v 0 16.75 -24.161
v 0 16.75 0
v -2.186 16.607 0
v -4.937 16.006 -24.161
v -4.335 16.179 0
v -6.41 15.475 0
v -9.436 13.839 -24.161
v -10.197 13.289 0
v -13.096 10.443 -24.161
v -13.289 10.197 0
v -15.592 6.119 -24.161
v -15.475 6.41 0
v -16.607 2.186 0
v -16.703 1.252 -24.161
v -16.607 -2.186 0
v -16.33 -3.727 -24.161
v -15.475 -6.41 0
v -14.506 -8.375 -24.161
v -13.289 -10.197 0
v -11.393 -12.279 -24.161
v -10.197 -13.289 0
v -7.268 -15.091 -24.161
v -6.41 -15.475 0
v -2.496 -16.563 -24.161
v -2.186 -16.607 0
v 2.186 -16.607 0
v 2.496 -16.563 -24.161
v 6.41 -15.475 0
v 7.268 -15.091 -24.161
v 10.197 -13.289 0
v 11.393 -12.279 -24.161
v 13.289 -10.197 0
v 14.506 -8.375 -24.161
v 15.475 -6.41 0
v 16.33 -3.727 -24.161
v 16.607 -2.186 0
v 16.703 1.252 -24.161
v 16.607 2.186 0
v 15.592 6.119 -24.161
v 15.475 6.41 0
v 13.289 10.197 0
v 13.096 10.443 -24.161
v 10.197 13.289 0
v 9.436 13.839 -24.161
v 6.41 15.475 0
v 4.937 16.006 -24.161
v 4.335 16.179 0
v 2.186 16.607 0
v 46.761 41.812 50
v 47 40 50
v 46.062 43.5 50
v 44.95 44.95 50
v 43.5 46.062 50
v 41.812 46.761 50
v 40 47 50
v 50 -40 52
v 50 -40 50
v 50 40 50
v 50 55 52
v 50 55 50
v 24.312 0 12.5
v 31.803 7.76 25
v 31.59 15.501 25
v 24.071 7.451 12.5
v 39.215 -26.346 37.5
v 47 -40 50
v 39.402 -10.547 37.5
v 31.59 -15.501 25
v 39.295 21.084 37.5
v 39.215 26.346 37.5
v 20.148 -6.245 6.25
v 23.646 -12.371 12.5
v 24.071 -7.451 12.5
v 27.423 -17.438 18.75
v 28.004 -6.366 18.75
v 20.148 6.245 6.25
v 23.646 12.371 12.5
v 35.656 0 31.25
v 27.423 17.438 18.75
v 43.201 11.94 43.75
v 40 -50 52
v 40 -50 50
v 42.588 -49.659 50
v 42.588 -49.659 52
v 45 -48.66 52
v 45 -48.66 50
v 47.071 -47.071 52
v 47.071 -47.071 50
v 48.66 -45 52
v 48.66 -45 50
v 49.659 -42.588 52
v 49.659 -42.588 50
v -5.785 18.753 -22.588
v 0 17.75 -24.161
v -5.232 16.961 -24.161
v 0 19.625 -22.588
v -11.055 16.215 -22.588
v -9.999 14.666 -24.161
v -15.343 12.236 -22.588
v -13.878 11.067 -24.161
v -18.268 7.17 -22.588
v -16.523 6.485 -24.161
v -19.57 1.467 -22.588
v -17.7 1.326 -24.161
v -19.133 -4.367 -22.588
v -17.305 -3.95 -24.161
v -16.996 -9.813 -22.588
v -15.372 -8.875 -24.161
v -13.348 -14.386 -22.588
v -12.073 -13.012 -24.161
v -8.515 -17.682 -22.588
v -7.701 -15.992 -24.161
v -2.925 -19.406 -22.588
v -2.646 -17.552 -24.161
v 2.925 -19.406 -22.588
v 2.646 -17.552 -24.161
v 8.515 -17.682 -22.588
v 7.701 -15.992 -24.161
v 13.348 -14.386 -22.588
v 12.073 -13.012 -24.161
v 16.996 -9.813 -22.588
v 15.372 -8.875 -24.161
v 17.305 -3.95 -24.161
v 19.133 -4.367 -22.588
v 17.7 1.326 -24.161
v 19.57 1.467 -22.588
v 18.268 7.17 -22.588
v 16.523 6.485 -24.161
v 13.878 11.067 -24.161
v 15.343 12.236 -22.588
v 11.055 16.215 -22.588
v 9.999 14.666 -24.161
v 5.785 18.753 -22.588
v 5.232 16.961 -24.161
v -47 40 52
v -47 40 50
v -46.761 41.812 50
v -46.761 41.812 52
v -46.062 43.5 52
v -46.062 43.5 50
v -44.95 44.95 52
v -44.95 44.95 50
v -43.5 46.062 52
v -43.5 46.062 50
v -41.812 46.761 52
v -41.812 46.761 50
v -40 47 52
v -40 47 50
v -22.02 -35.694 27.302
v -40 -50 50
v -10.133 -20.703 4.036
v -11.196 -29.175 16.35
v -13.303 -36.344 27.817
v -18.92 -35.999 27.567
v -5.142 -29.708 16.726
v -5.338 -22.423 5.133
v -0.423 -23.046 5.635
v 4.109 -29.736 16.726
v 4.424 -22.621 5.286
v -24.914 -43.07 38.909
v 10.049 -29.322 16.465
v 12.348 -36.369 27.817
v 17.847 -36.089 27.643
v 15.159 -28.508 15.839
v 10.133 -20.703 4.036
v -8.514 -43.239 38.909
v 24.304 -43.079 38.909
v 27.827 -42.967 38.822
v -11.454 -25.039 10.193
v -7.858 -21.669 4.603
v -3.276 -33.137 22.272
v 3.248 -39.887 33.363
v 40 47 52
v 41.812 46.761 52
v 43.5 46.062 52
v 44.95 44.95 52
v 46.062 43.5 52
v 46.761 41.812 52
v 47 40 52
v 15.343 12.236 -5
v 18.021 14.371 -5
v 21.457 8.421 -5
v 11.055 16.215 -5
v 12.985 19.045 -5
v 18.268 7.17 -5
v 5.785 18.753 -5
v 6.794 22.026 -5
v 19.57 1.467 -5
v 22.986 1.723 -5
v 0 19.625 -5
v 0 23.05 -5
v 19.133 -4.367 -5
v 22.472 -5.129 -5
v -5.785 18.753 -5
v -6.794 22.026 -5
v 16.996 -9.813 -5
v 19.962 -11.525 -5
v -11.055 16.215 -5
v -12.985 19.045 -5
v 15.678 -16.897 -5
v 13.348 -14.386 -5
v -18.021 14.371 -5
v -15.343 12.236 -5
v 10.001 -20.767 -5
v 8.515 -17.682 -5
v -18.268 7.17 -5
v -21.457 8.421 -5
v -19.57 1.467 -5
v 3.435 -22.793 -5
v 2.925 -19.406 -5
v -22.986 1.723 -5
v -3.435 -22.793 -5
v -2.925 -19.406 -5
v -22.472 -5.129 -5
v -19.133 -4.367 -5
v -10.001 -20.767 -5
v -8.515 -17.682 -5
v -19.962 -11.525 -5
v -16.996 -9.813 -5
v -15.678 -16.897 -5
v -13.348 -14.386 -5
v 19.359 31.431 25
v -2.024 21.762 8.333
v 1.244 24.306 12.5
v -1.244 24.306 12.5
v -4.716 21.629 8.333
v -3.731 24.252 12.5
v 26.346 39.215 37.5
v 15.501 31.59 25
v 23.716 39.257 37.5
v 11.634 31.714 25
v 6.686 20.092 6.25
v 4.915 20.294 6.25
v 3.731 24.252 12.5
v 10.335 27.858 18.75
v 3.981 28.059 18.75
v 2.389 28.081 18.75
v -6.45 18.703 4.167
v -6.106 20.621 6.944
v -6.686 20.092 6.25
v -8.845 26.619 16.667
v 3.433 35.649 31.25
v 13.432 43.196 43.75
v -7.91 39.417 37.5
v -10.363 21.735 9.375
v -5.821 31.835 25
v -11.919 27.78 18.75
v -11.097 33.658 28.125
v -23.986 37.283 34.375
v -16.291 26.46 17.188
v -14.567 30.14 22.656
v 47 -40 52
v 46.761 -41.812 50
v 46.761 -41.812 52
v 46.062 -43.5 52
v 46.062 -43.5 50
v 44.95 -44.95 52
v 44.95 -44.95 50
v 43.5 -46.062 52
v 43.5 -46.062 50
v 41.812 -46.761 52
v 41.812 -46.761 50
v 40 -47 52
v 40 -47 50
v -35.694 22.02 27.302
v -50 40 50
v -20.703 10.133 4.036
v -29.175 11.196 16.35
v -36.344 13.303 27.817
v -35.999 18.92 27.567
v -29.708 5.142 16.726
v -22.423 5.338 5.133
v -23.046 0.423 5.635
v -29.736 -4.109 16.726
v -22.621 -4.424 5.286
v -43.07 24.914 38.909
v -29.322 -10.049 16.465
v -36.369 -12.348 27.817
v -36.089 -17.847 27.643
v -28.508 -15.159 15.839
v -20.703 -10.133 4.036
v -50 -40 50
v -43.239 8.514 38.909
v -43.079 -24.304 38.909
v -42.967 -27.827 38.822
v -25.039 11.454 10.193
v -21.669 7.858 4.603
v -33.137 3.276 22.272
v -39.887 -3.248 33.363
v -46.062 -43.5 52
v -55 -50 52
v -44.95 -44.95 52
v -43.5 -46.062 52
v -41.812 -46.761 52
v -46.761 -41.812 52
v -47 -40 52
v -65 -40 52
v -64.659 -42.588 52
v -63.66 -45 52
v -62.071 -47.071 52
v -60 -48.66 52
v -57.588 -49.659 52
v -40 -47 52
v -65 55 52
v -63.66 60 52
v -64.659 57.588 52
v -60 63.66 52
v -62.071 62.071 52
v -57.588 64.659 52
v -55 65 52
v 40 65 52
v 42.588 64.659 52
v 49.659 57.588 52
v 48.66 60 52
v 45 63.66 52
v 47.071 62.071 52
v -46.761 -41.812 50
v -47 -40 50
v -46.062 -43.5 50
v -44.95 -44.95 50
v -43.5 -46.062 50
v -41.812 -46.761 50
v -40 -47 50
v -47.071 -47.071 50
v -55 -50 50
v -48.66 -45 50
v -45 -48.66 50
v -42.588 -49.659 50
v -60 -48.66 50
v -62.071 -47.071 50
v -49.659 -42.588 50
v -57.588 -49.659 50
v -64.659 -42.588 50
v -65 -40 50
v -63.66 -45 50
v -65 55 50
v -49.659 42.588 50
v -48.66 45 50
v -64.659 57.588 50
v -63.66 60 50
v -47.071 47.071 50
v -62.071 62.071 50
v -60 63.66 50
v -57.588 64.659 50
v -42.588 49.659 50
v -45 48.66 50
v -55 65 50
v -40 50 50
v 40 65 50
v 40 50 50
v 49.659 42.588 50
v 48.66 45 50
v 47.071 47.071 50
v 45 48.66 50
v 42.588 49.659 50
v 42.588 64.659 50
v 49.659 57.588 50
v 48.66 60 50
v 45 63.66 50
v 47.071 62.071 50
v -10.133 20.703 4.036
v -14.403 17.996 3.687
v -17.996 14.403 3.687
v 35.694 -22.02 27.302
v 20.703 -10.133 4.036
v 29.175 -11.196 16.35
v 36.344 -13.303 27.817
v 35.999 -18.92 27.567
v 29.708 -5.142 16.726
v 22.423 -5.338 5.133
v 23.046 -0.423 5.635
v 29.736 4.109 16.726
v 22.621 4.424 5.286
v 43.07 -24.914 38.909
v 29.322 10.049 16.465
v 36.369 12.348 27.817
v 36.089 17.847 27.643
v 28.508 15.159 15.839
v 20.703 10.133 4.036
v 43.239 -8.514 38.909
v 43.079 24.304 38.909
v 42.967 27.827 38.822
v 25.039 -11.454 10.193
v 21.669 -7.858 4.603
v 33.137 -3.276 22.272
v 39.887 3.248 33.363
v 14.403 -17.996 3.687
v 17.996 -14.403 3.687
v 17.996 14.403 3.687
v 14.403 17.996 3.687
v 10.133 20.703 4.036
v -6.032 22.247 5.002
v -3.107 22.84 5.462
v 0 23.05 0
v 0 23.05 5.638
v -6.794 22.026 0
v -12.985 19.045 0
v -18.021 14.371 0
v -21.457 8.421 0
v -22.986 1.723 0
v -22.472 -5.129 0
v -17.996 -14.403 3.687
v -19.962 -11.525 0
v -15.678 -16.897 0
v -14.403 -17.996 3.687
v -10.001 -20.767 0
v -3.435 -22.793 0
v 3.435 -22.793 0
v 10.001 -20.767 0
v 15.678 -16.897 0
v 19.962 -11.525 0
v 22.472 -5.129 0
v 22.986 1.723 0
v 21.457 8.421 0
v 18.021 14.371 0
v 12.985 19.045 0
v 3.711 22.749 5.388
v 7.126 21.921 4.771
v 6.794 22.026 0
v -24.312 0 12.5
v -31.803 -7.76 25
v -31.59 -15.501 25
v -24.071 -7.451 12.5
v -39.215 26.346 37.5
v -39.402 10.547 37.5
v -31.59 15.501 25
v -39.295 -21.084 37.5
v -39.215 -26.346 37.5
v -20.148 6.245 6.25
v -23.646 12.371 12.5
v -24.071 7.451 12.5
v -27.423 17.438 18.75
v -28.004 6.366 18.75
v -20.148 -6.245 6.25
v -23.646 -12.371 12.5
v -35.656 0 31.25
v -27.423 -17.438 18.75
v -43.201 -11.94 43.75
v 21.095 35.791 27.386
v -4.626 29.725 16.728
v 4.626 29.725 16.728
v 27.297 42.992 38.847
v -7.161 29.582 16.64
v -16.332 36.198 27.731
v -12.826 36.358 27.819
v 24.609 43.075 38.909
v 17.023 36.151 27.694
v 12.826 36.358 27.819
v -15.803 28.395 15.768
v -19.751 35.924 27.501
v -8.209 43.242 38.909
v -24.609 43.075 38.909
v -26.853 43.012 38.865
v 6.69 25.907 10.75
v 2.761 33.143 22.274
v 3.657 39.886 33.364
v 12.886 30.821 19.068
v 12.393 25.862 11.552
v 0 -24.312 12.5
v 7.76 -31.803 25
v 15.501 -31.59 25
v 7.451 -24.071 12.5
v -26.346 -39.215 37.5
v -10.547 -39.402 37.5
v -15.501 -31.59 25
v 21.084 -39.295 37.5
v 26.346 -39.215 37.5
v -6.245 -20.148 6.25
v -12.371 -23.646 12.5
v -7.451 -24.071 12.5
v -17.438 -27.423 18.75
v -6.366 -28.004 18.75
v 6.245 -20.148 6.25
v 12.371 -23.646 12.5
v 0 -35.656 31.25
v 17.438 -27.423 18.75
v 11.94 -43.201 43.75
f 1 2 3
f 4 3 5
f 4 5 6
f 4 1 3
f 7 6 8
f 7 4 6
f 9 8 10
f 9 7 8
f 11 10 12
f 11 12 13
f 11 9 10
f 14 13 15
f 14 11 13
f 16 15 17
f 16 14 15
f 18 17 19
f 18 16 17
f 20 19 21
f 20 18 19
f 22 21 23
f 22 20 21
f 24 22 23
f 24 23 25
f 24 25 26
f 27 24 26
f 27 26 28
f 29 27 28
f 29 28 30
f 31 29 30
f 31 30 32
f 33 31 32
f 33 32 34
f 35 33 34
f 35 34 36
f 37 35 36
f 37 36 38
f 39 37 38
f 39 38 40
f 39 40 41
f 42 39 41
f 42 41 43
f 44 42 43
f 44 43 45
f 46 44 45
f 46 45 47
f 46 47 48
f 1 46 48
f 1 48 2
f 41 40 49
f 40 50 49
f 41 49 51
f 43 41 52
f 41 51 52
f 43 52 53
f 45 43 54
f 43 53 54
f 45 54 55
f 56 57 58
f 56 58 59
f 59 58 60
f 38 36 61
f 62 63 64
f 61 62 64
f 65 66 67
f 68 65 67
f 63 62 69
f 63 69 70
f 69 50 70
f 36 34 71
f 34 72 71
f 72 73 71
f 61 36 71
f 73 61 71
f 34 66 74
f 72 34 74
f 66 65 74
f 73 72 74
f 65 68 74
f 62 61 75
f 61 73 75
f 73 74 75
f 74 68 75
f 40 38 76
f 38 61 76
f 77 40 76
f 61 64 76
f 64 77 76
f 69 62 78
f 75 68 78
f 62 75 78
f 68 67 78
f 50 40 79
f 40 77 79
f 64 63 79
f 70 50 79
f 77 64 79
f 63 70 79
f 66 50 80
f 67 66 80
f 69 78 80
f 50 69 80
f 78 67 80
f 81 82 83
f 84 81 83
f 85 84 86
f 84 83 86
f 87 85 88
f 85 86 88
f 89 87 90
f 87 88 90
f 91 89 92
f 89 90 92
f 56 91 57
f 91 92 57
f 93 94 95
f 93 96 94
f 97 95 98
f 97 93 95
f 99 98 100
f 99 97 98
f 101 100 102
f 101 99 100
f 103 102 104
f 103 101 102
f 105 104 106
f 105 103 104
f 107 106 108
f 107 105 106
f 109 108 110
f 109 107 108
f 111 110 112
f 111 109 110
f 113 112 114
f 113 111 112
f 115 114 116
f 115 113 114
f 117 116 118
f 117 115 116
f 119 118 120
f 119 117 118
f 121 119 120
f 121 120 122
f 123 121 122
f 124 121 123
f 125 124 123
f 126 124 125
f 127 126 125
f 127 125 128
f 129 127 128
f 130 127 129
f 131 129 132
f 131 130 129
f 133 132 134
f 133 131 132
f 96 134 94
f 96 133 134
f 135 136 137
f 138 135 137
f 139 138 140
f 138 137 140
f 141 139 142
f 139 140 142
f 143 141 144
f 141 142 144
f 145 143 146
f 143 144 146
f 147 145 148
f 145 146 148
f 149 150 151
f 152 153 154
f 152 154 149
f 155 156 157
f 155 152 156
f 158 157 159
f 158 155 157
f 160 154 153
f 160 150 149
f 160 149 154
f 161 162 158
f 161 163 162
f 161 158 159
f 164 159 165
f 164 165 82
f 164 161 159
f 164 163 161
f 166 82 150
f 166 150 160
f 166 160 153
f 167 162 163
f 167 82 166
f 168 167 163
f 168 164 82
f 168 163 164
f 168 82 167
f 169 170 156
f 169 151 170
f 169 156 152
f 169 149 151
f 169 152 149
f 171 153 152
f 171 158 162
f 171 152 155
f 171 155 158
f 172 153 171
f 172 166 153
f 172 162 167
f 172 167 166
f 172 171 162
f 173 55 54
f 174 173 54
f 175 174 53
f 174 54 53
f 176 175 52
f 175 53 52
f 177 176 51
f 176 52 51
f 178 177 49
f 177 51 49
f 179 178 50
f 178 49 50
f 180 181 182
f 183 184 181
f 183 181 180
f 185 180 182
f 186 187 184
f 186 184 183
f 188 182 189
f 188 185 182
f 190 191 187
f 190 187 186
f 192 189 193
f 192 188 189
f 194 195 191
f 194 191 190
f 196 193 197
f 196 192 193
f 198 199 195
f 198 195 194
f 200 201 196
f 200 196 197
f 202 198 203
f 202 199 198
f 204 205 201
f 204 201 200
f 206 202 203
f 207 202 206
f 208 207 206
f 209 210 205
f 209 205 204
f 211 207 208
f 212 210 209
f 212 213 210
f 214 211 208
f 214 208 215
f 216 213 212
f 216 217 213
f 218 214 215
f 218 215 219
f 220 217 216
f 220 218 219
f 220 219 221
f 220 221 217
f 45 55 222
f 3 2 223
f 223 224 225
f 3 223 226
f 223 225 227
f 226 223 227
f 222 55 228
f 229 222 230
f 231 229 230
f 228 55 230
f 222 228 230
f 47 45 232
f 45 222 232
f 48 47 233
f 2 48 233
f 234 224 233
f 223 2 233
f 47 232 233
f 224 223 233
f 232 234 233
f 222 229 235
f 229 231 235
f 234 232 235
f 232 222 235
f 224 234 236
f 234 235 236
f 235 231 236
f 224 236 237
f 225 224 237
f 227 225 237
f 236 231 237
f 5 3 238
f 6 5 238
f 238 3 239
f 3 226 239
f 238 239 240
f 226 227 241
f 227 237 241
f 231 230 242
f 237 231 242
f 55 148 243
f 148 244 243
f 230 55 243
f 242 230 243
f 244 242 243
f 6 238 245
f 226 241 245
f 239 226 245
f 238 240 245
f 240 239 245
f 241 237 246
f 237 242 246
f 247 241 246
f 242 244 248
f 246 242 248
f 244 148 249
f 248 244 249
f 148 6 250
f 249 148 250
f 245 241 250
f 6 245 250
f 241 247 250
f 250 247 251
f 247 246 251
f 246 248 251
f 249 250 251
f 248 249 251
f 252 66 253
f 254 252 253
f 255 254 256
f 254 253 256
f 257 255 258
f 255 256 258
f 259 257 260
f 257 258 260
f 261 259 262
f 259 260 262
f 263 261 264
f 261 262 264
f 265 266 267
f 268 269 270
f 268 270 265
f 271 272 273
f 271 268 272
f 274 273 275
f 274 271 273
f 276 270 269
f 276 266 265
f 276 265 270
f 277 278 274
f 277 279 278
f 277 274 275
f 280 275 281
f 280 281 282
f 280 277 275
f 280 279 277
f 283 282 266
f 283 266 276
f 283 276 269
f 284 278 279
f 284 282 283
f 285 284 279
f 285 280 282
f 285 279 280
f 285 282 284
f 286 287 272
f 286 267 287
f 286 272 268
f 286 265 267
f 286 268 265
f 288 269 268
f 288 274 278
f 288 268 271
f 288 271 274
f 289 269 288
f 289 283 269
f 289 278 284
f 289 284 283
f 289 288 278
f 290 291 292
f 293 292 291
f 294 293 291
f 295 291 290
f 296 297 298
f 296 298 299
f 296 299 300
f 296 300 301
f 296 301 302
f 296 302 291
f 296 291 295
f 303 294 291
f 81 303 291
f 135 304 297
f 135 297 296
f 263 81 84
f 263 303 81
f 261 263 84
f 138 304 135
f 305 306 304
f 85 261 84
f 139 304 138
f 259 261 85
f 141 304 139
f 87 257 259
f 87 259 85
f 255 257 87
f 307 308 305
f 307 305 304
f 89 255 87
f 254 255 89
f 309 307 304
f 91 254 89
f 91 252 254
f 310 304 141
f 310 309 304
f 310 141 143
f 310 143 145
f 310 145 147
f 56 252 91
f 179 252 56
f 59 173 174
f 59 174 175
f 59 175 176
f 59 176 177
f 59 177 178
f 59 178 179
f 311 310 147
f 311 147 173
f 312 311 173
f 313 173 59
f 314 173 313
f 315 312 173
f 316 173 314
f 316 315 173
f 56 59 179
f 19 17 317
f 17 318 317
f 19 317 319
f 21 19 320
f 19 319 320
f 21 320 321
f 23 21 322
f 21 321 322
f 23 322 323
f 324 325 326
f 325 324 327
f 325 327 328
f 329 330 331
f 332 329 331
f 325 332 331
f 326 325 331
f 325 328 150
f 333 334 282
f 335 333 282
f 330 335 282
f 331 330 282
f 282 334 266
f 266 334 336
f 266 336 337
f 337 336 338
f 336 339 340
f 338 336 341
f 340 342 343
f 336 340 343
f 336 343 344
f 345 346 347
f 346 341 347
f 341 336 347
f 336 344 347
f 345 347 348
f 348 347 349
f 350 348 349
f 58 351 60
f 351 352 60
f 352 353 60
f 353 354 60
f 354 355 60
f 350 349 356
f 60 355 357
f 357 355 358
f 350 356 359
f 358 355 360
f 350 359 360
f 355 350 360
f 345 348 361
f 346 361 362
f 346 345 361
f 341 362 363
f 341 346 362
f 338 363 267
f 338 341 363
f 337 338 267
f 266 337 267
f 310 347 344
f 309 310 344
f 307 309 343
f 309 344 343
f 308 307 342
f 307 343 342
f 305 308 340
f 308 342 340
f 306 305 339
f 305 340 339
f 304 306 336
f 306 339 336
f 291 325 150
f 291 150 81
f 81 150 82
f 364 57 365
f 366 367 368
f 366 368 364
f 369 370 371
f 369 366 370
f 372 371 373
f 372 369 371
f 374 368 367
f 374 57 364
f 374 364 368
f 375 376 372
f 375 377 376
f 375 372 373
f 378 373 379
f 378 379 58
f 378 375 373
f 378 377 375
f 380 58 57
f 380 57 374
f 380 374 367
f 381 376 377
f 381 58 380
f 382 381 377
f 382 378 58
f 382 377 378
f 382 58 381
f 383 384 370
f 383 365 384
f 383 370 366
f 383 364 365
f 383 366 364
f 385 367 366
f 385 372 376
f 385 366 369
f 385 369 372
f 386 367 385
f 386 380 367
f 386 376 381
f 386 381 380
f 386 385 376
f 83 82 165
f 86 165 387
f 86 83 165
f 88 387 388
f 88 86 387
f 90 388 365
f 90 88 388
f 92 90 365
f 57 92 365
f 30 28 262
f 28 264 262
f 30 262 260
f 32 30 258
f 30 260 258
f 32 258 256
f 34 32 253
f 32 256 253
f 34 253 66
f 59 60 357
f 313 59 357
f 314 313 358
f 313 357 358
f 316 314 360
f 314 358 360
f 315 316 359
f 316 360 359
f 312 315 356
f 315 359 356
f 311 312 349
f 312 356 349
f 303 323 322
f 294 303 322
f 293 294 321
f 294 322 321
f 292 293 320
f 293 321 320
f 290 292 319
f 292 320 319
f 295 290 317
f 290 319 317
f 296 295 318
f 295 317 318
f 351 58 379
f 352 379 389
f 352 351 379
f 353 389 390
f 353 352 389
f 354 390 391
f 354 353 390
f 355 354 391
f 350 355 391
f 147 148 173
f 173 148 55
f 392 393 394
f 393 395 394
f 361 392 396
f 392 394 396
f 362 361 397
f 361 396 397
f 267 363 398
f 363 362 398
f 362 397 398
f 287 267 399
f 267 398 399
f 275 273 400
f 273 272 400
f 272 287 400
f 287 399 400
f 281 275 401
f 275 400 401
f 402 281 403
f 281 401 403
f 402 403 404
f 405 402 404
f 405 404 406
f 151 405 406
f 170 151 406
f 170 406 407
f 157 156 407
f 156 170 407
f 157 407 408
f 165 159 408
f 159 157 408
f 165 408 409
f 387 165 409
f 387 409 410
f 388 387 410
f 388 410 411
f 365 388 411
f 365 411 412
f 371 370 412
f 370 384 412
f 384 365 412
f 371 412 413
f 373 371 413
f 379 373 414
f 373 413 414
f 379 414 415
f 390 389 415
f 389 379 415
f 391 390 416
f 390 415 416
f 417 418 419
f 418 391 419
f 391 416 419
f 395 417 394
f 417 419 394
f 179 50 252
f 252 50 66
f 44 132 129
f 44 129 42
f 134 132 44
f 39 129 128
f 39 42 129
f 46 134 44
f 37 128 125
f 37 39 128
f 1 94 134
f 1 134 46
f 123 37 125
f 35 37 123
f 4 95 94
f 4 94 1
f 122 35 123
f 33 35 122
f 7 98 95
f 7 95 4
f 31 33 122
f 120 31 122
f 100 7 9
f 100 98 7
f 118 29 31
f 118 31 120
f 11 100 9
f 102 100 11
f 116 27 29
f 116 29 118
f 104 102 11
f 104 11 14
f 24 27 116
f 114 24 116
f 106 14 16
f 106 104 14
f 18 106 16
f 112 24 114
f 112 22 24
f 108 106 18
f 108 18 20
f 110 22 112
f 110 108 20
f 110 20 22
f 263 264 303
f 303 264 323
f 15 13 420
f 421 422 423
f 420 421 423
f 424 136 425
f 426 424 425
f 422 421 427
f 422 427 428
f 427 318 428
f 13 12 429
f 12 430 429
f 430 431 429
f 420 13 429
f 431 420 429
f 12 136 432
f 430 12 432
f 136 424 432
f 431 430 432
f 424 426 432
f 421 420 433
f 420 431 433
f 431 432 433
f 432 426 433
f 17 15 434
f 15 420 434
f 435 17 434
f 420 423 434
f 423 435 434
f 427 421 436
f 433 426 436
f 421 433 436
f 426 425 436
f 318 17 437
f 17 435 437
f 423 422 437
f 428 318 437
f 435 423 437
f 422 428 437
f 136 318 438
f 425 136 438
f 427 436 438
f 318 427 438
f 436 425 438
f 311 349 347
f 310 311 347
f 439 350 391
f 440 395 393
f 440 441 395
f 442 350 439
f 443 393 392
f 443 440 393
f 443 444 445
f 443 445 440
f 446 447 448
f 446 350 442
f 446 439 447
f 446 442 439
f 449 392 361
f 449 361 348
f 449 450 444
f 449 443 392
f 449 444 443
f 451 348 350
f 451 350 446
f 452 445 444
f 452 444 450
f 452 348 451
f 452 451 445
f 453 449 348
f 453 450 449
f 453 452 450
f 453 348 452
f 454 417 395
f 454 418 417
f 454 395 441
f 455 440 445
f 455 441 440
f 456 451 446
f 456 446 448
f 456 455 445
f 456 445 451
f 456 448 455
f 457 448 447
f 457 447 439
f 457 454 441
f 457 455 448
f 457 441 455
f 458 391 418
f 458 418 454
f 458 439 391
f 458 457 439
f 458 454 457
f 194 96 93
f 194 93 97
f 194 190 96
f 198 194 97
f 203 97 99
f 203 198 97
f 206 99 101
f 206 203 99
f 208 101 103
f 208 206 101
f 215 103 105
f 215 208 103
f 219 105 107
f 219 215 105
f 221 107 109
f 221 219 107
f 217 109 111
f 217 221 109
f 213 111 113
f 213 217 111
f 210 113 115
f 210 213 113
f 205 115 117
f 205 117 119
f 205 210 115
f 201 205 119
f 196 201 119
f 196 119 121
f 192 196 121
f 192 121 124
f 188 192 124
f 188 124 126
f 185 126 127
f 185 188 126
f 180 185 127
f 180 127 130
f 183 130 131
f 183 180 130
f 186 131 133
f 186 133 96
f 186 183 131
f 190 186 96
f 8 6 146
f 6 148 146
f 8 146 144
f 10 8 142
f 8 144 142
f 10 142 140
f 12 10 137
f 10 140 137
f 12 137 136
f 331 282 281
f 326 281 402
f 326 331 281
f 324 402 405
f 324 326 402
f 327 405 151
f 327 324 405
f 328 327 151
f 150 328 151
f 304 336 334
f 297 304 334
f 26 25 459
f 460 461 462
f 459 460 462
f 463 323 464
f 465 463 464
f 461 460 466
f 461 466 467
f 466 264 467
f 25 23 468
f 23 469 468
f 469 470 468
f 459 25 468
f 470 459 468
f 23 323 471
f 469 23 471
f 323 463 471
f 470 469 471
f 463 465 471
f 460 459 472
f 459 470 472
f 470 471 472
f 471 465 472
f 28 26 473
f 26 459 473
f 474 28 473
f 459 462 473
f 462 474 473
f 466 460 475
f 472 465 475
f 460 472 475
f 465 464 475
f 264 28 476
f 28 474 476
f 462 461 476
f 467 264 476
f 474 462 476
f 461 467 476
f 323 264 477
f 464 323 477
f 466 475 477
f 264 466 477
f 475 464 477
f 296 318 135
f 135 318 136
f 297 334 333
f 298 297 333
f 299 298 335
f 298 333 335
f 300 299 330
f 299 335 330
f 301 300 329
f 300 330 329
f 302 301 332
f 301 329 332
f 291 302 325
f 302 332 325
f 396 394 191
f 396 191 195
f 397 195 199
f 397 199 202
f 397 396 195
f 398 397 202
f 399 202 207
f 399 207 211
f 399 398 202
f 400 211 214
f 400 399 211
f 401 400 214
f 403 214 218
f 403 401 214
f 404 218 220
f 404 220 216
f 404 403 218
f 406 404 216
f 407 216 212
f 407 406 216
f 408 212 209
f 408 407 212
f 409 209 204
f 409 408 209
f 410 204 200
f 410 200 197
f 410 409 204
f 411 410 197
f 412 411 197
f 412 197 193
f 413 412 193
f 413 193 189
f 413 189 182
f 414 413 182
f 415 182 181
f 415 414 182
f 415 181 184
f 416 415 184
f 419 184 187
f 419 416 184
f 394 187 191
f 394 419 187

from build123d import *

# Parameters (mm, degrees)
REVOLUTION004_FACE6_R = 23.05
PAD006_DEPTH          = 10
PAD007_DEPTH          = 2
PAD008_DEPTH          = 2


with BuildPart() as part:
    # Sketch016 → Revolution003 (revolve)
    with BuildSketch(Plane.YZ):
        Polygon((19.625, -22.587589), (19.625, 0), (16.75, 0), (16.75, -24.1609), (17.75, -24.1609), align=None)
    revolve(axis=Axis((0, 0, 0), (0, 0, 1)))

    # Export → Loft section 0
    with BuildSketch(Plane.XY):
        with BuildLine():
            ThreePointArc((7.510162, 18.131136), (0, 19.625), (-7.510162, 18.131136))
            ThreePointArc((-7.510162, 18.131136), (-13.876971, 13.876971), (-18.131136, 7.510162))
            ThreePointArc((-18.131136, 7.510162), (-19.625, 0), (-18.131136, -7.510162))
            ThreePointArc((-18.131136, -7.510162), (-13.876971, -13.876971), (-7.510162, -18.131136))
            ThreePointArc((-7.510162, -18.131136), (0, -19.625), (7.510162, -18.131136))
            ThreePointArc((7.510162, -18.131136), (13.876971, -13.876971), (18.131136, -7.510162))
            ThreePointArc((18.131136, -7.510162), (19.625, 0), (18.131136, 7.510162))
            ThreePointArc((18.131136, 7.510162), (13.876971, 13.876971), (7.510162, 18.131136))
        make_face()
    # Export002 → Loft section 1
    with BuildSketch(Plane.XY.offset(50)):
        with BuildLine():
            Line((-50, 40), (-50, -40))
            ThreePointArc((-50, -40), (-47.071068, -47.071068), (-40, -50))
            Line((-40, -50), (40, -50))
            ThreePointArc((40, -50), (47.071068, -47.071068), (50, -40))
            Line((50, -40), (50, 40))
            ThreePointArc((50, 40), (47.071068, 47.071068), (40, 50))
            Line((40, 50), (-40, 50))
            ThreePointArc((-40, 50), (-47.071068, 47.071068), (-50, 40))
        make_face()
    loft()

    # Sketch020 → Revolution004 (revolve)
    with BuildSketch(Plane.YZ):
        Polygon((23.05, 0), (16.75, 0), (16.75, -5), (19.625, -5), (23.05, -5), align=None)
    revolve(axis=Axis((0, 0, 0), (0, 0, 1)))

    # Revolution004 Face6 → Pad006 (new)
    with BuildSketch(Plane(origin=(0, 0, 0), x_dir=(0, 1, 0), z_dir=(0, 0, 1))):
        Circle(REVOLUTION004_FACE6_R)
        with BuildLine():
            ThreePointArc((19.625, 0), (19.247911, -3.828648), (18.131136, -7.510162))
            ThreePointArc((18.131136, -7.510162), (13.876971, -13.876971), (7.510162, -18.131136))
            ThreePointArc((7.510162, -18.131136), (0, -19.625), (-7.510162, -18.131136))
            ThreePointArc((-7.510162, -18.131136), (-13.876971, -13.876971), (-18.131136, -7.510162))
            ThreePointArc((-18.131136, -7.510162), (-19.625, 0), (-18.131136, 7.510162))
            ThreePointArc((-18.131136, 7.510162), (-13.876971, 13.876971), (-7.510162, 18.131136))
            ThreePointArc((-7.510162, 18.131136), (0, 19.625), (7.510162, 18.131136))
            ThreePointArc((7.510162, 18.131136), (13.876971, 13.876971), (18.131136, 7.510162))
            ThreePointArc((18.131136, 7.510162), (19.247911, 3.828648), (19.625, 0))
        make_face(mode=Mode.SUBTRACT)
    extrude(amount=PAD006_DEPTH)

    # Export003 → Loft001 section 0
    with BuildSketch(Plane.XY):
        with BuildLine():
            ThreePointArc((6.409947, 15.474982), (0, 16.75), (-6.409947, 15.474982))
            ThreePointArc((-6.409947, 15.474982), (-11.844039, 11.844039), (-15.474982, 6.409947))
            ThreePointArc((-15.474982, 6.409947), (-16.75, 0), (-15.474982, -6.409947))
            ThreePointArc((-15.474982, -6.409947), (-11.844039, -11.844039), (-6.409947, -15.474982))
            ThreePointArc((-6.409947, -15.474982), (0, -16.75), (6.409947, -15.474982))
            ThreePointArc((6.409947, -15.474982), (11.844039, -11.844039), (15.474982, -6.409947))
            ThreePointArc((15.474982, -6.409947), (16.75, 0), (15.474982, 6.409947))
            ThreePointArc((15.474982, 6.409947), (11.844039, 11.844039), (6.409947, 15.474982))
        make_face()
    # Export004 → Loft001 section 1
    with BuildSketch(Plane.XY.offset(50)):
        with BuildLine():
            Line((-47, 40), (-47, -40))
            ThreePointArc((-47, -40), (-44.949747, -44.949747), (-40, -47))
            Line((-40, -47), (40, -47))
            ThreePointArc((40, -47), (44.949747, -44.949747), (47, -40))
            Line((47, -40), (47, 40))
            ThreePointArc((47, 40), (44.949747, 44.949747), (40, 47))
            Line((40, 47), (-40, 47))
            ThreePointArc((-40, 47), (-44.949747, 44.949747), (-47, 40))
        make_face()
    loft(mode=Mode.SUBTRACT)

    # Loft001 Face13 → Pad007 (add)
    with BuildSketch(Plane(origin=(0, 0, 50), x_dir=(0, 1, 0), z_dir=(0, 0, 1))):
        with BuildLine():
            Line((40, 50), (-40, 50))
            ThreePointArc((-40, 50), (-47.071068, 47.071068), (-50, 40))
            Line((-50, 40), (-50, -40))
            ThreePointArc((-50, -40), (-47.071068, -47.071068), (-40, -50))
            Line((-40, -50), (40, -50))
            ThreePointArc((40, -50), (47.071068, -47.071068), (50, -40))
            Line((50, -40), (50, 40))
            ThreePointArc((50, 40), (47.071068, 47.071068), (40, 50))
        make_face()
        with BuildLine():
            Line((47, 40), (47, -40))
            ThreePointArc((47, -40), (44.949747, -44.949747), (40, -47))
            Line((40, -47), (-40, -47))
            ThreePointArc((-40, -47), (-44.949747, -44.949747), (-47, -40))
            Line((-47, -40), (-47, 40))
            ThreePointArc((-47, 40), (-44.949747, 44.949747), (-40, 47))
            Line((-40, 47), (40, 47))
            ThreePointArc((40, 47), (44.949747, 44.949747), (47, 40))
        make_face(mode=Mode.SUBTRACT)
    extrude(amount=PAD007_DEPTH)

    # Sketch019 (on Sketch) → Pad008 (join)
    with BuildSketch(Plane.XY.offset(50)):
        with BuildLine():
            ThreePointArc((50, 55), (47.071068, 62.071068), (40, 65))
            Line((40, 65), (-55, 65))
            ThreePointArc((-55, 65), (-62.071068, 62.071068), (-65, 55))
            Line((-65, 55), (-65, -40))
            ThreePointArc((-65, -40), (-62.071068, -47.071068), (-55, -50))
            Line((-55, -50), (-40, -50))
            Line((-40, -50), (-40, -47))
            ThreePointArc((-40, -47), (-44.949747, -44.949747), (-47, -40))
            Line((-47, -40), (-47, 40))
            ThreePointArc((-47, 40), (-44.949747, 44.949747), (-40, 47))
            Line((-40, 47), (40, 47))
            ThreePointArc((40, 47), (44.949747, 44.949747), (47, 40))
            Line((47, 40), (50, 40))
            Line((50, 40), (50, 55))
        make_face()
    extrude(amount=PAD008_DEPTH)


solid = part.part
